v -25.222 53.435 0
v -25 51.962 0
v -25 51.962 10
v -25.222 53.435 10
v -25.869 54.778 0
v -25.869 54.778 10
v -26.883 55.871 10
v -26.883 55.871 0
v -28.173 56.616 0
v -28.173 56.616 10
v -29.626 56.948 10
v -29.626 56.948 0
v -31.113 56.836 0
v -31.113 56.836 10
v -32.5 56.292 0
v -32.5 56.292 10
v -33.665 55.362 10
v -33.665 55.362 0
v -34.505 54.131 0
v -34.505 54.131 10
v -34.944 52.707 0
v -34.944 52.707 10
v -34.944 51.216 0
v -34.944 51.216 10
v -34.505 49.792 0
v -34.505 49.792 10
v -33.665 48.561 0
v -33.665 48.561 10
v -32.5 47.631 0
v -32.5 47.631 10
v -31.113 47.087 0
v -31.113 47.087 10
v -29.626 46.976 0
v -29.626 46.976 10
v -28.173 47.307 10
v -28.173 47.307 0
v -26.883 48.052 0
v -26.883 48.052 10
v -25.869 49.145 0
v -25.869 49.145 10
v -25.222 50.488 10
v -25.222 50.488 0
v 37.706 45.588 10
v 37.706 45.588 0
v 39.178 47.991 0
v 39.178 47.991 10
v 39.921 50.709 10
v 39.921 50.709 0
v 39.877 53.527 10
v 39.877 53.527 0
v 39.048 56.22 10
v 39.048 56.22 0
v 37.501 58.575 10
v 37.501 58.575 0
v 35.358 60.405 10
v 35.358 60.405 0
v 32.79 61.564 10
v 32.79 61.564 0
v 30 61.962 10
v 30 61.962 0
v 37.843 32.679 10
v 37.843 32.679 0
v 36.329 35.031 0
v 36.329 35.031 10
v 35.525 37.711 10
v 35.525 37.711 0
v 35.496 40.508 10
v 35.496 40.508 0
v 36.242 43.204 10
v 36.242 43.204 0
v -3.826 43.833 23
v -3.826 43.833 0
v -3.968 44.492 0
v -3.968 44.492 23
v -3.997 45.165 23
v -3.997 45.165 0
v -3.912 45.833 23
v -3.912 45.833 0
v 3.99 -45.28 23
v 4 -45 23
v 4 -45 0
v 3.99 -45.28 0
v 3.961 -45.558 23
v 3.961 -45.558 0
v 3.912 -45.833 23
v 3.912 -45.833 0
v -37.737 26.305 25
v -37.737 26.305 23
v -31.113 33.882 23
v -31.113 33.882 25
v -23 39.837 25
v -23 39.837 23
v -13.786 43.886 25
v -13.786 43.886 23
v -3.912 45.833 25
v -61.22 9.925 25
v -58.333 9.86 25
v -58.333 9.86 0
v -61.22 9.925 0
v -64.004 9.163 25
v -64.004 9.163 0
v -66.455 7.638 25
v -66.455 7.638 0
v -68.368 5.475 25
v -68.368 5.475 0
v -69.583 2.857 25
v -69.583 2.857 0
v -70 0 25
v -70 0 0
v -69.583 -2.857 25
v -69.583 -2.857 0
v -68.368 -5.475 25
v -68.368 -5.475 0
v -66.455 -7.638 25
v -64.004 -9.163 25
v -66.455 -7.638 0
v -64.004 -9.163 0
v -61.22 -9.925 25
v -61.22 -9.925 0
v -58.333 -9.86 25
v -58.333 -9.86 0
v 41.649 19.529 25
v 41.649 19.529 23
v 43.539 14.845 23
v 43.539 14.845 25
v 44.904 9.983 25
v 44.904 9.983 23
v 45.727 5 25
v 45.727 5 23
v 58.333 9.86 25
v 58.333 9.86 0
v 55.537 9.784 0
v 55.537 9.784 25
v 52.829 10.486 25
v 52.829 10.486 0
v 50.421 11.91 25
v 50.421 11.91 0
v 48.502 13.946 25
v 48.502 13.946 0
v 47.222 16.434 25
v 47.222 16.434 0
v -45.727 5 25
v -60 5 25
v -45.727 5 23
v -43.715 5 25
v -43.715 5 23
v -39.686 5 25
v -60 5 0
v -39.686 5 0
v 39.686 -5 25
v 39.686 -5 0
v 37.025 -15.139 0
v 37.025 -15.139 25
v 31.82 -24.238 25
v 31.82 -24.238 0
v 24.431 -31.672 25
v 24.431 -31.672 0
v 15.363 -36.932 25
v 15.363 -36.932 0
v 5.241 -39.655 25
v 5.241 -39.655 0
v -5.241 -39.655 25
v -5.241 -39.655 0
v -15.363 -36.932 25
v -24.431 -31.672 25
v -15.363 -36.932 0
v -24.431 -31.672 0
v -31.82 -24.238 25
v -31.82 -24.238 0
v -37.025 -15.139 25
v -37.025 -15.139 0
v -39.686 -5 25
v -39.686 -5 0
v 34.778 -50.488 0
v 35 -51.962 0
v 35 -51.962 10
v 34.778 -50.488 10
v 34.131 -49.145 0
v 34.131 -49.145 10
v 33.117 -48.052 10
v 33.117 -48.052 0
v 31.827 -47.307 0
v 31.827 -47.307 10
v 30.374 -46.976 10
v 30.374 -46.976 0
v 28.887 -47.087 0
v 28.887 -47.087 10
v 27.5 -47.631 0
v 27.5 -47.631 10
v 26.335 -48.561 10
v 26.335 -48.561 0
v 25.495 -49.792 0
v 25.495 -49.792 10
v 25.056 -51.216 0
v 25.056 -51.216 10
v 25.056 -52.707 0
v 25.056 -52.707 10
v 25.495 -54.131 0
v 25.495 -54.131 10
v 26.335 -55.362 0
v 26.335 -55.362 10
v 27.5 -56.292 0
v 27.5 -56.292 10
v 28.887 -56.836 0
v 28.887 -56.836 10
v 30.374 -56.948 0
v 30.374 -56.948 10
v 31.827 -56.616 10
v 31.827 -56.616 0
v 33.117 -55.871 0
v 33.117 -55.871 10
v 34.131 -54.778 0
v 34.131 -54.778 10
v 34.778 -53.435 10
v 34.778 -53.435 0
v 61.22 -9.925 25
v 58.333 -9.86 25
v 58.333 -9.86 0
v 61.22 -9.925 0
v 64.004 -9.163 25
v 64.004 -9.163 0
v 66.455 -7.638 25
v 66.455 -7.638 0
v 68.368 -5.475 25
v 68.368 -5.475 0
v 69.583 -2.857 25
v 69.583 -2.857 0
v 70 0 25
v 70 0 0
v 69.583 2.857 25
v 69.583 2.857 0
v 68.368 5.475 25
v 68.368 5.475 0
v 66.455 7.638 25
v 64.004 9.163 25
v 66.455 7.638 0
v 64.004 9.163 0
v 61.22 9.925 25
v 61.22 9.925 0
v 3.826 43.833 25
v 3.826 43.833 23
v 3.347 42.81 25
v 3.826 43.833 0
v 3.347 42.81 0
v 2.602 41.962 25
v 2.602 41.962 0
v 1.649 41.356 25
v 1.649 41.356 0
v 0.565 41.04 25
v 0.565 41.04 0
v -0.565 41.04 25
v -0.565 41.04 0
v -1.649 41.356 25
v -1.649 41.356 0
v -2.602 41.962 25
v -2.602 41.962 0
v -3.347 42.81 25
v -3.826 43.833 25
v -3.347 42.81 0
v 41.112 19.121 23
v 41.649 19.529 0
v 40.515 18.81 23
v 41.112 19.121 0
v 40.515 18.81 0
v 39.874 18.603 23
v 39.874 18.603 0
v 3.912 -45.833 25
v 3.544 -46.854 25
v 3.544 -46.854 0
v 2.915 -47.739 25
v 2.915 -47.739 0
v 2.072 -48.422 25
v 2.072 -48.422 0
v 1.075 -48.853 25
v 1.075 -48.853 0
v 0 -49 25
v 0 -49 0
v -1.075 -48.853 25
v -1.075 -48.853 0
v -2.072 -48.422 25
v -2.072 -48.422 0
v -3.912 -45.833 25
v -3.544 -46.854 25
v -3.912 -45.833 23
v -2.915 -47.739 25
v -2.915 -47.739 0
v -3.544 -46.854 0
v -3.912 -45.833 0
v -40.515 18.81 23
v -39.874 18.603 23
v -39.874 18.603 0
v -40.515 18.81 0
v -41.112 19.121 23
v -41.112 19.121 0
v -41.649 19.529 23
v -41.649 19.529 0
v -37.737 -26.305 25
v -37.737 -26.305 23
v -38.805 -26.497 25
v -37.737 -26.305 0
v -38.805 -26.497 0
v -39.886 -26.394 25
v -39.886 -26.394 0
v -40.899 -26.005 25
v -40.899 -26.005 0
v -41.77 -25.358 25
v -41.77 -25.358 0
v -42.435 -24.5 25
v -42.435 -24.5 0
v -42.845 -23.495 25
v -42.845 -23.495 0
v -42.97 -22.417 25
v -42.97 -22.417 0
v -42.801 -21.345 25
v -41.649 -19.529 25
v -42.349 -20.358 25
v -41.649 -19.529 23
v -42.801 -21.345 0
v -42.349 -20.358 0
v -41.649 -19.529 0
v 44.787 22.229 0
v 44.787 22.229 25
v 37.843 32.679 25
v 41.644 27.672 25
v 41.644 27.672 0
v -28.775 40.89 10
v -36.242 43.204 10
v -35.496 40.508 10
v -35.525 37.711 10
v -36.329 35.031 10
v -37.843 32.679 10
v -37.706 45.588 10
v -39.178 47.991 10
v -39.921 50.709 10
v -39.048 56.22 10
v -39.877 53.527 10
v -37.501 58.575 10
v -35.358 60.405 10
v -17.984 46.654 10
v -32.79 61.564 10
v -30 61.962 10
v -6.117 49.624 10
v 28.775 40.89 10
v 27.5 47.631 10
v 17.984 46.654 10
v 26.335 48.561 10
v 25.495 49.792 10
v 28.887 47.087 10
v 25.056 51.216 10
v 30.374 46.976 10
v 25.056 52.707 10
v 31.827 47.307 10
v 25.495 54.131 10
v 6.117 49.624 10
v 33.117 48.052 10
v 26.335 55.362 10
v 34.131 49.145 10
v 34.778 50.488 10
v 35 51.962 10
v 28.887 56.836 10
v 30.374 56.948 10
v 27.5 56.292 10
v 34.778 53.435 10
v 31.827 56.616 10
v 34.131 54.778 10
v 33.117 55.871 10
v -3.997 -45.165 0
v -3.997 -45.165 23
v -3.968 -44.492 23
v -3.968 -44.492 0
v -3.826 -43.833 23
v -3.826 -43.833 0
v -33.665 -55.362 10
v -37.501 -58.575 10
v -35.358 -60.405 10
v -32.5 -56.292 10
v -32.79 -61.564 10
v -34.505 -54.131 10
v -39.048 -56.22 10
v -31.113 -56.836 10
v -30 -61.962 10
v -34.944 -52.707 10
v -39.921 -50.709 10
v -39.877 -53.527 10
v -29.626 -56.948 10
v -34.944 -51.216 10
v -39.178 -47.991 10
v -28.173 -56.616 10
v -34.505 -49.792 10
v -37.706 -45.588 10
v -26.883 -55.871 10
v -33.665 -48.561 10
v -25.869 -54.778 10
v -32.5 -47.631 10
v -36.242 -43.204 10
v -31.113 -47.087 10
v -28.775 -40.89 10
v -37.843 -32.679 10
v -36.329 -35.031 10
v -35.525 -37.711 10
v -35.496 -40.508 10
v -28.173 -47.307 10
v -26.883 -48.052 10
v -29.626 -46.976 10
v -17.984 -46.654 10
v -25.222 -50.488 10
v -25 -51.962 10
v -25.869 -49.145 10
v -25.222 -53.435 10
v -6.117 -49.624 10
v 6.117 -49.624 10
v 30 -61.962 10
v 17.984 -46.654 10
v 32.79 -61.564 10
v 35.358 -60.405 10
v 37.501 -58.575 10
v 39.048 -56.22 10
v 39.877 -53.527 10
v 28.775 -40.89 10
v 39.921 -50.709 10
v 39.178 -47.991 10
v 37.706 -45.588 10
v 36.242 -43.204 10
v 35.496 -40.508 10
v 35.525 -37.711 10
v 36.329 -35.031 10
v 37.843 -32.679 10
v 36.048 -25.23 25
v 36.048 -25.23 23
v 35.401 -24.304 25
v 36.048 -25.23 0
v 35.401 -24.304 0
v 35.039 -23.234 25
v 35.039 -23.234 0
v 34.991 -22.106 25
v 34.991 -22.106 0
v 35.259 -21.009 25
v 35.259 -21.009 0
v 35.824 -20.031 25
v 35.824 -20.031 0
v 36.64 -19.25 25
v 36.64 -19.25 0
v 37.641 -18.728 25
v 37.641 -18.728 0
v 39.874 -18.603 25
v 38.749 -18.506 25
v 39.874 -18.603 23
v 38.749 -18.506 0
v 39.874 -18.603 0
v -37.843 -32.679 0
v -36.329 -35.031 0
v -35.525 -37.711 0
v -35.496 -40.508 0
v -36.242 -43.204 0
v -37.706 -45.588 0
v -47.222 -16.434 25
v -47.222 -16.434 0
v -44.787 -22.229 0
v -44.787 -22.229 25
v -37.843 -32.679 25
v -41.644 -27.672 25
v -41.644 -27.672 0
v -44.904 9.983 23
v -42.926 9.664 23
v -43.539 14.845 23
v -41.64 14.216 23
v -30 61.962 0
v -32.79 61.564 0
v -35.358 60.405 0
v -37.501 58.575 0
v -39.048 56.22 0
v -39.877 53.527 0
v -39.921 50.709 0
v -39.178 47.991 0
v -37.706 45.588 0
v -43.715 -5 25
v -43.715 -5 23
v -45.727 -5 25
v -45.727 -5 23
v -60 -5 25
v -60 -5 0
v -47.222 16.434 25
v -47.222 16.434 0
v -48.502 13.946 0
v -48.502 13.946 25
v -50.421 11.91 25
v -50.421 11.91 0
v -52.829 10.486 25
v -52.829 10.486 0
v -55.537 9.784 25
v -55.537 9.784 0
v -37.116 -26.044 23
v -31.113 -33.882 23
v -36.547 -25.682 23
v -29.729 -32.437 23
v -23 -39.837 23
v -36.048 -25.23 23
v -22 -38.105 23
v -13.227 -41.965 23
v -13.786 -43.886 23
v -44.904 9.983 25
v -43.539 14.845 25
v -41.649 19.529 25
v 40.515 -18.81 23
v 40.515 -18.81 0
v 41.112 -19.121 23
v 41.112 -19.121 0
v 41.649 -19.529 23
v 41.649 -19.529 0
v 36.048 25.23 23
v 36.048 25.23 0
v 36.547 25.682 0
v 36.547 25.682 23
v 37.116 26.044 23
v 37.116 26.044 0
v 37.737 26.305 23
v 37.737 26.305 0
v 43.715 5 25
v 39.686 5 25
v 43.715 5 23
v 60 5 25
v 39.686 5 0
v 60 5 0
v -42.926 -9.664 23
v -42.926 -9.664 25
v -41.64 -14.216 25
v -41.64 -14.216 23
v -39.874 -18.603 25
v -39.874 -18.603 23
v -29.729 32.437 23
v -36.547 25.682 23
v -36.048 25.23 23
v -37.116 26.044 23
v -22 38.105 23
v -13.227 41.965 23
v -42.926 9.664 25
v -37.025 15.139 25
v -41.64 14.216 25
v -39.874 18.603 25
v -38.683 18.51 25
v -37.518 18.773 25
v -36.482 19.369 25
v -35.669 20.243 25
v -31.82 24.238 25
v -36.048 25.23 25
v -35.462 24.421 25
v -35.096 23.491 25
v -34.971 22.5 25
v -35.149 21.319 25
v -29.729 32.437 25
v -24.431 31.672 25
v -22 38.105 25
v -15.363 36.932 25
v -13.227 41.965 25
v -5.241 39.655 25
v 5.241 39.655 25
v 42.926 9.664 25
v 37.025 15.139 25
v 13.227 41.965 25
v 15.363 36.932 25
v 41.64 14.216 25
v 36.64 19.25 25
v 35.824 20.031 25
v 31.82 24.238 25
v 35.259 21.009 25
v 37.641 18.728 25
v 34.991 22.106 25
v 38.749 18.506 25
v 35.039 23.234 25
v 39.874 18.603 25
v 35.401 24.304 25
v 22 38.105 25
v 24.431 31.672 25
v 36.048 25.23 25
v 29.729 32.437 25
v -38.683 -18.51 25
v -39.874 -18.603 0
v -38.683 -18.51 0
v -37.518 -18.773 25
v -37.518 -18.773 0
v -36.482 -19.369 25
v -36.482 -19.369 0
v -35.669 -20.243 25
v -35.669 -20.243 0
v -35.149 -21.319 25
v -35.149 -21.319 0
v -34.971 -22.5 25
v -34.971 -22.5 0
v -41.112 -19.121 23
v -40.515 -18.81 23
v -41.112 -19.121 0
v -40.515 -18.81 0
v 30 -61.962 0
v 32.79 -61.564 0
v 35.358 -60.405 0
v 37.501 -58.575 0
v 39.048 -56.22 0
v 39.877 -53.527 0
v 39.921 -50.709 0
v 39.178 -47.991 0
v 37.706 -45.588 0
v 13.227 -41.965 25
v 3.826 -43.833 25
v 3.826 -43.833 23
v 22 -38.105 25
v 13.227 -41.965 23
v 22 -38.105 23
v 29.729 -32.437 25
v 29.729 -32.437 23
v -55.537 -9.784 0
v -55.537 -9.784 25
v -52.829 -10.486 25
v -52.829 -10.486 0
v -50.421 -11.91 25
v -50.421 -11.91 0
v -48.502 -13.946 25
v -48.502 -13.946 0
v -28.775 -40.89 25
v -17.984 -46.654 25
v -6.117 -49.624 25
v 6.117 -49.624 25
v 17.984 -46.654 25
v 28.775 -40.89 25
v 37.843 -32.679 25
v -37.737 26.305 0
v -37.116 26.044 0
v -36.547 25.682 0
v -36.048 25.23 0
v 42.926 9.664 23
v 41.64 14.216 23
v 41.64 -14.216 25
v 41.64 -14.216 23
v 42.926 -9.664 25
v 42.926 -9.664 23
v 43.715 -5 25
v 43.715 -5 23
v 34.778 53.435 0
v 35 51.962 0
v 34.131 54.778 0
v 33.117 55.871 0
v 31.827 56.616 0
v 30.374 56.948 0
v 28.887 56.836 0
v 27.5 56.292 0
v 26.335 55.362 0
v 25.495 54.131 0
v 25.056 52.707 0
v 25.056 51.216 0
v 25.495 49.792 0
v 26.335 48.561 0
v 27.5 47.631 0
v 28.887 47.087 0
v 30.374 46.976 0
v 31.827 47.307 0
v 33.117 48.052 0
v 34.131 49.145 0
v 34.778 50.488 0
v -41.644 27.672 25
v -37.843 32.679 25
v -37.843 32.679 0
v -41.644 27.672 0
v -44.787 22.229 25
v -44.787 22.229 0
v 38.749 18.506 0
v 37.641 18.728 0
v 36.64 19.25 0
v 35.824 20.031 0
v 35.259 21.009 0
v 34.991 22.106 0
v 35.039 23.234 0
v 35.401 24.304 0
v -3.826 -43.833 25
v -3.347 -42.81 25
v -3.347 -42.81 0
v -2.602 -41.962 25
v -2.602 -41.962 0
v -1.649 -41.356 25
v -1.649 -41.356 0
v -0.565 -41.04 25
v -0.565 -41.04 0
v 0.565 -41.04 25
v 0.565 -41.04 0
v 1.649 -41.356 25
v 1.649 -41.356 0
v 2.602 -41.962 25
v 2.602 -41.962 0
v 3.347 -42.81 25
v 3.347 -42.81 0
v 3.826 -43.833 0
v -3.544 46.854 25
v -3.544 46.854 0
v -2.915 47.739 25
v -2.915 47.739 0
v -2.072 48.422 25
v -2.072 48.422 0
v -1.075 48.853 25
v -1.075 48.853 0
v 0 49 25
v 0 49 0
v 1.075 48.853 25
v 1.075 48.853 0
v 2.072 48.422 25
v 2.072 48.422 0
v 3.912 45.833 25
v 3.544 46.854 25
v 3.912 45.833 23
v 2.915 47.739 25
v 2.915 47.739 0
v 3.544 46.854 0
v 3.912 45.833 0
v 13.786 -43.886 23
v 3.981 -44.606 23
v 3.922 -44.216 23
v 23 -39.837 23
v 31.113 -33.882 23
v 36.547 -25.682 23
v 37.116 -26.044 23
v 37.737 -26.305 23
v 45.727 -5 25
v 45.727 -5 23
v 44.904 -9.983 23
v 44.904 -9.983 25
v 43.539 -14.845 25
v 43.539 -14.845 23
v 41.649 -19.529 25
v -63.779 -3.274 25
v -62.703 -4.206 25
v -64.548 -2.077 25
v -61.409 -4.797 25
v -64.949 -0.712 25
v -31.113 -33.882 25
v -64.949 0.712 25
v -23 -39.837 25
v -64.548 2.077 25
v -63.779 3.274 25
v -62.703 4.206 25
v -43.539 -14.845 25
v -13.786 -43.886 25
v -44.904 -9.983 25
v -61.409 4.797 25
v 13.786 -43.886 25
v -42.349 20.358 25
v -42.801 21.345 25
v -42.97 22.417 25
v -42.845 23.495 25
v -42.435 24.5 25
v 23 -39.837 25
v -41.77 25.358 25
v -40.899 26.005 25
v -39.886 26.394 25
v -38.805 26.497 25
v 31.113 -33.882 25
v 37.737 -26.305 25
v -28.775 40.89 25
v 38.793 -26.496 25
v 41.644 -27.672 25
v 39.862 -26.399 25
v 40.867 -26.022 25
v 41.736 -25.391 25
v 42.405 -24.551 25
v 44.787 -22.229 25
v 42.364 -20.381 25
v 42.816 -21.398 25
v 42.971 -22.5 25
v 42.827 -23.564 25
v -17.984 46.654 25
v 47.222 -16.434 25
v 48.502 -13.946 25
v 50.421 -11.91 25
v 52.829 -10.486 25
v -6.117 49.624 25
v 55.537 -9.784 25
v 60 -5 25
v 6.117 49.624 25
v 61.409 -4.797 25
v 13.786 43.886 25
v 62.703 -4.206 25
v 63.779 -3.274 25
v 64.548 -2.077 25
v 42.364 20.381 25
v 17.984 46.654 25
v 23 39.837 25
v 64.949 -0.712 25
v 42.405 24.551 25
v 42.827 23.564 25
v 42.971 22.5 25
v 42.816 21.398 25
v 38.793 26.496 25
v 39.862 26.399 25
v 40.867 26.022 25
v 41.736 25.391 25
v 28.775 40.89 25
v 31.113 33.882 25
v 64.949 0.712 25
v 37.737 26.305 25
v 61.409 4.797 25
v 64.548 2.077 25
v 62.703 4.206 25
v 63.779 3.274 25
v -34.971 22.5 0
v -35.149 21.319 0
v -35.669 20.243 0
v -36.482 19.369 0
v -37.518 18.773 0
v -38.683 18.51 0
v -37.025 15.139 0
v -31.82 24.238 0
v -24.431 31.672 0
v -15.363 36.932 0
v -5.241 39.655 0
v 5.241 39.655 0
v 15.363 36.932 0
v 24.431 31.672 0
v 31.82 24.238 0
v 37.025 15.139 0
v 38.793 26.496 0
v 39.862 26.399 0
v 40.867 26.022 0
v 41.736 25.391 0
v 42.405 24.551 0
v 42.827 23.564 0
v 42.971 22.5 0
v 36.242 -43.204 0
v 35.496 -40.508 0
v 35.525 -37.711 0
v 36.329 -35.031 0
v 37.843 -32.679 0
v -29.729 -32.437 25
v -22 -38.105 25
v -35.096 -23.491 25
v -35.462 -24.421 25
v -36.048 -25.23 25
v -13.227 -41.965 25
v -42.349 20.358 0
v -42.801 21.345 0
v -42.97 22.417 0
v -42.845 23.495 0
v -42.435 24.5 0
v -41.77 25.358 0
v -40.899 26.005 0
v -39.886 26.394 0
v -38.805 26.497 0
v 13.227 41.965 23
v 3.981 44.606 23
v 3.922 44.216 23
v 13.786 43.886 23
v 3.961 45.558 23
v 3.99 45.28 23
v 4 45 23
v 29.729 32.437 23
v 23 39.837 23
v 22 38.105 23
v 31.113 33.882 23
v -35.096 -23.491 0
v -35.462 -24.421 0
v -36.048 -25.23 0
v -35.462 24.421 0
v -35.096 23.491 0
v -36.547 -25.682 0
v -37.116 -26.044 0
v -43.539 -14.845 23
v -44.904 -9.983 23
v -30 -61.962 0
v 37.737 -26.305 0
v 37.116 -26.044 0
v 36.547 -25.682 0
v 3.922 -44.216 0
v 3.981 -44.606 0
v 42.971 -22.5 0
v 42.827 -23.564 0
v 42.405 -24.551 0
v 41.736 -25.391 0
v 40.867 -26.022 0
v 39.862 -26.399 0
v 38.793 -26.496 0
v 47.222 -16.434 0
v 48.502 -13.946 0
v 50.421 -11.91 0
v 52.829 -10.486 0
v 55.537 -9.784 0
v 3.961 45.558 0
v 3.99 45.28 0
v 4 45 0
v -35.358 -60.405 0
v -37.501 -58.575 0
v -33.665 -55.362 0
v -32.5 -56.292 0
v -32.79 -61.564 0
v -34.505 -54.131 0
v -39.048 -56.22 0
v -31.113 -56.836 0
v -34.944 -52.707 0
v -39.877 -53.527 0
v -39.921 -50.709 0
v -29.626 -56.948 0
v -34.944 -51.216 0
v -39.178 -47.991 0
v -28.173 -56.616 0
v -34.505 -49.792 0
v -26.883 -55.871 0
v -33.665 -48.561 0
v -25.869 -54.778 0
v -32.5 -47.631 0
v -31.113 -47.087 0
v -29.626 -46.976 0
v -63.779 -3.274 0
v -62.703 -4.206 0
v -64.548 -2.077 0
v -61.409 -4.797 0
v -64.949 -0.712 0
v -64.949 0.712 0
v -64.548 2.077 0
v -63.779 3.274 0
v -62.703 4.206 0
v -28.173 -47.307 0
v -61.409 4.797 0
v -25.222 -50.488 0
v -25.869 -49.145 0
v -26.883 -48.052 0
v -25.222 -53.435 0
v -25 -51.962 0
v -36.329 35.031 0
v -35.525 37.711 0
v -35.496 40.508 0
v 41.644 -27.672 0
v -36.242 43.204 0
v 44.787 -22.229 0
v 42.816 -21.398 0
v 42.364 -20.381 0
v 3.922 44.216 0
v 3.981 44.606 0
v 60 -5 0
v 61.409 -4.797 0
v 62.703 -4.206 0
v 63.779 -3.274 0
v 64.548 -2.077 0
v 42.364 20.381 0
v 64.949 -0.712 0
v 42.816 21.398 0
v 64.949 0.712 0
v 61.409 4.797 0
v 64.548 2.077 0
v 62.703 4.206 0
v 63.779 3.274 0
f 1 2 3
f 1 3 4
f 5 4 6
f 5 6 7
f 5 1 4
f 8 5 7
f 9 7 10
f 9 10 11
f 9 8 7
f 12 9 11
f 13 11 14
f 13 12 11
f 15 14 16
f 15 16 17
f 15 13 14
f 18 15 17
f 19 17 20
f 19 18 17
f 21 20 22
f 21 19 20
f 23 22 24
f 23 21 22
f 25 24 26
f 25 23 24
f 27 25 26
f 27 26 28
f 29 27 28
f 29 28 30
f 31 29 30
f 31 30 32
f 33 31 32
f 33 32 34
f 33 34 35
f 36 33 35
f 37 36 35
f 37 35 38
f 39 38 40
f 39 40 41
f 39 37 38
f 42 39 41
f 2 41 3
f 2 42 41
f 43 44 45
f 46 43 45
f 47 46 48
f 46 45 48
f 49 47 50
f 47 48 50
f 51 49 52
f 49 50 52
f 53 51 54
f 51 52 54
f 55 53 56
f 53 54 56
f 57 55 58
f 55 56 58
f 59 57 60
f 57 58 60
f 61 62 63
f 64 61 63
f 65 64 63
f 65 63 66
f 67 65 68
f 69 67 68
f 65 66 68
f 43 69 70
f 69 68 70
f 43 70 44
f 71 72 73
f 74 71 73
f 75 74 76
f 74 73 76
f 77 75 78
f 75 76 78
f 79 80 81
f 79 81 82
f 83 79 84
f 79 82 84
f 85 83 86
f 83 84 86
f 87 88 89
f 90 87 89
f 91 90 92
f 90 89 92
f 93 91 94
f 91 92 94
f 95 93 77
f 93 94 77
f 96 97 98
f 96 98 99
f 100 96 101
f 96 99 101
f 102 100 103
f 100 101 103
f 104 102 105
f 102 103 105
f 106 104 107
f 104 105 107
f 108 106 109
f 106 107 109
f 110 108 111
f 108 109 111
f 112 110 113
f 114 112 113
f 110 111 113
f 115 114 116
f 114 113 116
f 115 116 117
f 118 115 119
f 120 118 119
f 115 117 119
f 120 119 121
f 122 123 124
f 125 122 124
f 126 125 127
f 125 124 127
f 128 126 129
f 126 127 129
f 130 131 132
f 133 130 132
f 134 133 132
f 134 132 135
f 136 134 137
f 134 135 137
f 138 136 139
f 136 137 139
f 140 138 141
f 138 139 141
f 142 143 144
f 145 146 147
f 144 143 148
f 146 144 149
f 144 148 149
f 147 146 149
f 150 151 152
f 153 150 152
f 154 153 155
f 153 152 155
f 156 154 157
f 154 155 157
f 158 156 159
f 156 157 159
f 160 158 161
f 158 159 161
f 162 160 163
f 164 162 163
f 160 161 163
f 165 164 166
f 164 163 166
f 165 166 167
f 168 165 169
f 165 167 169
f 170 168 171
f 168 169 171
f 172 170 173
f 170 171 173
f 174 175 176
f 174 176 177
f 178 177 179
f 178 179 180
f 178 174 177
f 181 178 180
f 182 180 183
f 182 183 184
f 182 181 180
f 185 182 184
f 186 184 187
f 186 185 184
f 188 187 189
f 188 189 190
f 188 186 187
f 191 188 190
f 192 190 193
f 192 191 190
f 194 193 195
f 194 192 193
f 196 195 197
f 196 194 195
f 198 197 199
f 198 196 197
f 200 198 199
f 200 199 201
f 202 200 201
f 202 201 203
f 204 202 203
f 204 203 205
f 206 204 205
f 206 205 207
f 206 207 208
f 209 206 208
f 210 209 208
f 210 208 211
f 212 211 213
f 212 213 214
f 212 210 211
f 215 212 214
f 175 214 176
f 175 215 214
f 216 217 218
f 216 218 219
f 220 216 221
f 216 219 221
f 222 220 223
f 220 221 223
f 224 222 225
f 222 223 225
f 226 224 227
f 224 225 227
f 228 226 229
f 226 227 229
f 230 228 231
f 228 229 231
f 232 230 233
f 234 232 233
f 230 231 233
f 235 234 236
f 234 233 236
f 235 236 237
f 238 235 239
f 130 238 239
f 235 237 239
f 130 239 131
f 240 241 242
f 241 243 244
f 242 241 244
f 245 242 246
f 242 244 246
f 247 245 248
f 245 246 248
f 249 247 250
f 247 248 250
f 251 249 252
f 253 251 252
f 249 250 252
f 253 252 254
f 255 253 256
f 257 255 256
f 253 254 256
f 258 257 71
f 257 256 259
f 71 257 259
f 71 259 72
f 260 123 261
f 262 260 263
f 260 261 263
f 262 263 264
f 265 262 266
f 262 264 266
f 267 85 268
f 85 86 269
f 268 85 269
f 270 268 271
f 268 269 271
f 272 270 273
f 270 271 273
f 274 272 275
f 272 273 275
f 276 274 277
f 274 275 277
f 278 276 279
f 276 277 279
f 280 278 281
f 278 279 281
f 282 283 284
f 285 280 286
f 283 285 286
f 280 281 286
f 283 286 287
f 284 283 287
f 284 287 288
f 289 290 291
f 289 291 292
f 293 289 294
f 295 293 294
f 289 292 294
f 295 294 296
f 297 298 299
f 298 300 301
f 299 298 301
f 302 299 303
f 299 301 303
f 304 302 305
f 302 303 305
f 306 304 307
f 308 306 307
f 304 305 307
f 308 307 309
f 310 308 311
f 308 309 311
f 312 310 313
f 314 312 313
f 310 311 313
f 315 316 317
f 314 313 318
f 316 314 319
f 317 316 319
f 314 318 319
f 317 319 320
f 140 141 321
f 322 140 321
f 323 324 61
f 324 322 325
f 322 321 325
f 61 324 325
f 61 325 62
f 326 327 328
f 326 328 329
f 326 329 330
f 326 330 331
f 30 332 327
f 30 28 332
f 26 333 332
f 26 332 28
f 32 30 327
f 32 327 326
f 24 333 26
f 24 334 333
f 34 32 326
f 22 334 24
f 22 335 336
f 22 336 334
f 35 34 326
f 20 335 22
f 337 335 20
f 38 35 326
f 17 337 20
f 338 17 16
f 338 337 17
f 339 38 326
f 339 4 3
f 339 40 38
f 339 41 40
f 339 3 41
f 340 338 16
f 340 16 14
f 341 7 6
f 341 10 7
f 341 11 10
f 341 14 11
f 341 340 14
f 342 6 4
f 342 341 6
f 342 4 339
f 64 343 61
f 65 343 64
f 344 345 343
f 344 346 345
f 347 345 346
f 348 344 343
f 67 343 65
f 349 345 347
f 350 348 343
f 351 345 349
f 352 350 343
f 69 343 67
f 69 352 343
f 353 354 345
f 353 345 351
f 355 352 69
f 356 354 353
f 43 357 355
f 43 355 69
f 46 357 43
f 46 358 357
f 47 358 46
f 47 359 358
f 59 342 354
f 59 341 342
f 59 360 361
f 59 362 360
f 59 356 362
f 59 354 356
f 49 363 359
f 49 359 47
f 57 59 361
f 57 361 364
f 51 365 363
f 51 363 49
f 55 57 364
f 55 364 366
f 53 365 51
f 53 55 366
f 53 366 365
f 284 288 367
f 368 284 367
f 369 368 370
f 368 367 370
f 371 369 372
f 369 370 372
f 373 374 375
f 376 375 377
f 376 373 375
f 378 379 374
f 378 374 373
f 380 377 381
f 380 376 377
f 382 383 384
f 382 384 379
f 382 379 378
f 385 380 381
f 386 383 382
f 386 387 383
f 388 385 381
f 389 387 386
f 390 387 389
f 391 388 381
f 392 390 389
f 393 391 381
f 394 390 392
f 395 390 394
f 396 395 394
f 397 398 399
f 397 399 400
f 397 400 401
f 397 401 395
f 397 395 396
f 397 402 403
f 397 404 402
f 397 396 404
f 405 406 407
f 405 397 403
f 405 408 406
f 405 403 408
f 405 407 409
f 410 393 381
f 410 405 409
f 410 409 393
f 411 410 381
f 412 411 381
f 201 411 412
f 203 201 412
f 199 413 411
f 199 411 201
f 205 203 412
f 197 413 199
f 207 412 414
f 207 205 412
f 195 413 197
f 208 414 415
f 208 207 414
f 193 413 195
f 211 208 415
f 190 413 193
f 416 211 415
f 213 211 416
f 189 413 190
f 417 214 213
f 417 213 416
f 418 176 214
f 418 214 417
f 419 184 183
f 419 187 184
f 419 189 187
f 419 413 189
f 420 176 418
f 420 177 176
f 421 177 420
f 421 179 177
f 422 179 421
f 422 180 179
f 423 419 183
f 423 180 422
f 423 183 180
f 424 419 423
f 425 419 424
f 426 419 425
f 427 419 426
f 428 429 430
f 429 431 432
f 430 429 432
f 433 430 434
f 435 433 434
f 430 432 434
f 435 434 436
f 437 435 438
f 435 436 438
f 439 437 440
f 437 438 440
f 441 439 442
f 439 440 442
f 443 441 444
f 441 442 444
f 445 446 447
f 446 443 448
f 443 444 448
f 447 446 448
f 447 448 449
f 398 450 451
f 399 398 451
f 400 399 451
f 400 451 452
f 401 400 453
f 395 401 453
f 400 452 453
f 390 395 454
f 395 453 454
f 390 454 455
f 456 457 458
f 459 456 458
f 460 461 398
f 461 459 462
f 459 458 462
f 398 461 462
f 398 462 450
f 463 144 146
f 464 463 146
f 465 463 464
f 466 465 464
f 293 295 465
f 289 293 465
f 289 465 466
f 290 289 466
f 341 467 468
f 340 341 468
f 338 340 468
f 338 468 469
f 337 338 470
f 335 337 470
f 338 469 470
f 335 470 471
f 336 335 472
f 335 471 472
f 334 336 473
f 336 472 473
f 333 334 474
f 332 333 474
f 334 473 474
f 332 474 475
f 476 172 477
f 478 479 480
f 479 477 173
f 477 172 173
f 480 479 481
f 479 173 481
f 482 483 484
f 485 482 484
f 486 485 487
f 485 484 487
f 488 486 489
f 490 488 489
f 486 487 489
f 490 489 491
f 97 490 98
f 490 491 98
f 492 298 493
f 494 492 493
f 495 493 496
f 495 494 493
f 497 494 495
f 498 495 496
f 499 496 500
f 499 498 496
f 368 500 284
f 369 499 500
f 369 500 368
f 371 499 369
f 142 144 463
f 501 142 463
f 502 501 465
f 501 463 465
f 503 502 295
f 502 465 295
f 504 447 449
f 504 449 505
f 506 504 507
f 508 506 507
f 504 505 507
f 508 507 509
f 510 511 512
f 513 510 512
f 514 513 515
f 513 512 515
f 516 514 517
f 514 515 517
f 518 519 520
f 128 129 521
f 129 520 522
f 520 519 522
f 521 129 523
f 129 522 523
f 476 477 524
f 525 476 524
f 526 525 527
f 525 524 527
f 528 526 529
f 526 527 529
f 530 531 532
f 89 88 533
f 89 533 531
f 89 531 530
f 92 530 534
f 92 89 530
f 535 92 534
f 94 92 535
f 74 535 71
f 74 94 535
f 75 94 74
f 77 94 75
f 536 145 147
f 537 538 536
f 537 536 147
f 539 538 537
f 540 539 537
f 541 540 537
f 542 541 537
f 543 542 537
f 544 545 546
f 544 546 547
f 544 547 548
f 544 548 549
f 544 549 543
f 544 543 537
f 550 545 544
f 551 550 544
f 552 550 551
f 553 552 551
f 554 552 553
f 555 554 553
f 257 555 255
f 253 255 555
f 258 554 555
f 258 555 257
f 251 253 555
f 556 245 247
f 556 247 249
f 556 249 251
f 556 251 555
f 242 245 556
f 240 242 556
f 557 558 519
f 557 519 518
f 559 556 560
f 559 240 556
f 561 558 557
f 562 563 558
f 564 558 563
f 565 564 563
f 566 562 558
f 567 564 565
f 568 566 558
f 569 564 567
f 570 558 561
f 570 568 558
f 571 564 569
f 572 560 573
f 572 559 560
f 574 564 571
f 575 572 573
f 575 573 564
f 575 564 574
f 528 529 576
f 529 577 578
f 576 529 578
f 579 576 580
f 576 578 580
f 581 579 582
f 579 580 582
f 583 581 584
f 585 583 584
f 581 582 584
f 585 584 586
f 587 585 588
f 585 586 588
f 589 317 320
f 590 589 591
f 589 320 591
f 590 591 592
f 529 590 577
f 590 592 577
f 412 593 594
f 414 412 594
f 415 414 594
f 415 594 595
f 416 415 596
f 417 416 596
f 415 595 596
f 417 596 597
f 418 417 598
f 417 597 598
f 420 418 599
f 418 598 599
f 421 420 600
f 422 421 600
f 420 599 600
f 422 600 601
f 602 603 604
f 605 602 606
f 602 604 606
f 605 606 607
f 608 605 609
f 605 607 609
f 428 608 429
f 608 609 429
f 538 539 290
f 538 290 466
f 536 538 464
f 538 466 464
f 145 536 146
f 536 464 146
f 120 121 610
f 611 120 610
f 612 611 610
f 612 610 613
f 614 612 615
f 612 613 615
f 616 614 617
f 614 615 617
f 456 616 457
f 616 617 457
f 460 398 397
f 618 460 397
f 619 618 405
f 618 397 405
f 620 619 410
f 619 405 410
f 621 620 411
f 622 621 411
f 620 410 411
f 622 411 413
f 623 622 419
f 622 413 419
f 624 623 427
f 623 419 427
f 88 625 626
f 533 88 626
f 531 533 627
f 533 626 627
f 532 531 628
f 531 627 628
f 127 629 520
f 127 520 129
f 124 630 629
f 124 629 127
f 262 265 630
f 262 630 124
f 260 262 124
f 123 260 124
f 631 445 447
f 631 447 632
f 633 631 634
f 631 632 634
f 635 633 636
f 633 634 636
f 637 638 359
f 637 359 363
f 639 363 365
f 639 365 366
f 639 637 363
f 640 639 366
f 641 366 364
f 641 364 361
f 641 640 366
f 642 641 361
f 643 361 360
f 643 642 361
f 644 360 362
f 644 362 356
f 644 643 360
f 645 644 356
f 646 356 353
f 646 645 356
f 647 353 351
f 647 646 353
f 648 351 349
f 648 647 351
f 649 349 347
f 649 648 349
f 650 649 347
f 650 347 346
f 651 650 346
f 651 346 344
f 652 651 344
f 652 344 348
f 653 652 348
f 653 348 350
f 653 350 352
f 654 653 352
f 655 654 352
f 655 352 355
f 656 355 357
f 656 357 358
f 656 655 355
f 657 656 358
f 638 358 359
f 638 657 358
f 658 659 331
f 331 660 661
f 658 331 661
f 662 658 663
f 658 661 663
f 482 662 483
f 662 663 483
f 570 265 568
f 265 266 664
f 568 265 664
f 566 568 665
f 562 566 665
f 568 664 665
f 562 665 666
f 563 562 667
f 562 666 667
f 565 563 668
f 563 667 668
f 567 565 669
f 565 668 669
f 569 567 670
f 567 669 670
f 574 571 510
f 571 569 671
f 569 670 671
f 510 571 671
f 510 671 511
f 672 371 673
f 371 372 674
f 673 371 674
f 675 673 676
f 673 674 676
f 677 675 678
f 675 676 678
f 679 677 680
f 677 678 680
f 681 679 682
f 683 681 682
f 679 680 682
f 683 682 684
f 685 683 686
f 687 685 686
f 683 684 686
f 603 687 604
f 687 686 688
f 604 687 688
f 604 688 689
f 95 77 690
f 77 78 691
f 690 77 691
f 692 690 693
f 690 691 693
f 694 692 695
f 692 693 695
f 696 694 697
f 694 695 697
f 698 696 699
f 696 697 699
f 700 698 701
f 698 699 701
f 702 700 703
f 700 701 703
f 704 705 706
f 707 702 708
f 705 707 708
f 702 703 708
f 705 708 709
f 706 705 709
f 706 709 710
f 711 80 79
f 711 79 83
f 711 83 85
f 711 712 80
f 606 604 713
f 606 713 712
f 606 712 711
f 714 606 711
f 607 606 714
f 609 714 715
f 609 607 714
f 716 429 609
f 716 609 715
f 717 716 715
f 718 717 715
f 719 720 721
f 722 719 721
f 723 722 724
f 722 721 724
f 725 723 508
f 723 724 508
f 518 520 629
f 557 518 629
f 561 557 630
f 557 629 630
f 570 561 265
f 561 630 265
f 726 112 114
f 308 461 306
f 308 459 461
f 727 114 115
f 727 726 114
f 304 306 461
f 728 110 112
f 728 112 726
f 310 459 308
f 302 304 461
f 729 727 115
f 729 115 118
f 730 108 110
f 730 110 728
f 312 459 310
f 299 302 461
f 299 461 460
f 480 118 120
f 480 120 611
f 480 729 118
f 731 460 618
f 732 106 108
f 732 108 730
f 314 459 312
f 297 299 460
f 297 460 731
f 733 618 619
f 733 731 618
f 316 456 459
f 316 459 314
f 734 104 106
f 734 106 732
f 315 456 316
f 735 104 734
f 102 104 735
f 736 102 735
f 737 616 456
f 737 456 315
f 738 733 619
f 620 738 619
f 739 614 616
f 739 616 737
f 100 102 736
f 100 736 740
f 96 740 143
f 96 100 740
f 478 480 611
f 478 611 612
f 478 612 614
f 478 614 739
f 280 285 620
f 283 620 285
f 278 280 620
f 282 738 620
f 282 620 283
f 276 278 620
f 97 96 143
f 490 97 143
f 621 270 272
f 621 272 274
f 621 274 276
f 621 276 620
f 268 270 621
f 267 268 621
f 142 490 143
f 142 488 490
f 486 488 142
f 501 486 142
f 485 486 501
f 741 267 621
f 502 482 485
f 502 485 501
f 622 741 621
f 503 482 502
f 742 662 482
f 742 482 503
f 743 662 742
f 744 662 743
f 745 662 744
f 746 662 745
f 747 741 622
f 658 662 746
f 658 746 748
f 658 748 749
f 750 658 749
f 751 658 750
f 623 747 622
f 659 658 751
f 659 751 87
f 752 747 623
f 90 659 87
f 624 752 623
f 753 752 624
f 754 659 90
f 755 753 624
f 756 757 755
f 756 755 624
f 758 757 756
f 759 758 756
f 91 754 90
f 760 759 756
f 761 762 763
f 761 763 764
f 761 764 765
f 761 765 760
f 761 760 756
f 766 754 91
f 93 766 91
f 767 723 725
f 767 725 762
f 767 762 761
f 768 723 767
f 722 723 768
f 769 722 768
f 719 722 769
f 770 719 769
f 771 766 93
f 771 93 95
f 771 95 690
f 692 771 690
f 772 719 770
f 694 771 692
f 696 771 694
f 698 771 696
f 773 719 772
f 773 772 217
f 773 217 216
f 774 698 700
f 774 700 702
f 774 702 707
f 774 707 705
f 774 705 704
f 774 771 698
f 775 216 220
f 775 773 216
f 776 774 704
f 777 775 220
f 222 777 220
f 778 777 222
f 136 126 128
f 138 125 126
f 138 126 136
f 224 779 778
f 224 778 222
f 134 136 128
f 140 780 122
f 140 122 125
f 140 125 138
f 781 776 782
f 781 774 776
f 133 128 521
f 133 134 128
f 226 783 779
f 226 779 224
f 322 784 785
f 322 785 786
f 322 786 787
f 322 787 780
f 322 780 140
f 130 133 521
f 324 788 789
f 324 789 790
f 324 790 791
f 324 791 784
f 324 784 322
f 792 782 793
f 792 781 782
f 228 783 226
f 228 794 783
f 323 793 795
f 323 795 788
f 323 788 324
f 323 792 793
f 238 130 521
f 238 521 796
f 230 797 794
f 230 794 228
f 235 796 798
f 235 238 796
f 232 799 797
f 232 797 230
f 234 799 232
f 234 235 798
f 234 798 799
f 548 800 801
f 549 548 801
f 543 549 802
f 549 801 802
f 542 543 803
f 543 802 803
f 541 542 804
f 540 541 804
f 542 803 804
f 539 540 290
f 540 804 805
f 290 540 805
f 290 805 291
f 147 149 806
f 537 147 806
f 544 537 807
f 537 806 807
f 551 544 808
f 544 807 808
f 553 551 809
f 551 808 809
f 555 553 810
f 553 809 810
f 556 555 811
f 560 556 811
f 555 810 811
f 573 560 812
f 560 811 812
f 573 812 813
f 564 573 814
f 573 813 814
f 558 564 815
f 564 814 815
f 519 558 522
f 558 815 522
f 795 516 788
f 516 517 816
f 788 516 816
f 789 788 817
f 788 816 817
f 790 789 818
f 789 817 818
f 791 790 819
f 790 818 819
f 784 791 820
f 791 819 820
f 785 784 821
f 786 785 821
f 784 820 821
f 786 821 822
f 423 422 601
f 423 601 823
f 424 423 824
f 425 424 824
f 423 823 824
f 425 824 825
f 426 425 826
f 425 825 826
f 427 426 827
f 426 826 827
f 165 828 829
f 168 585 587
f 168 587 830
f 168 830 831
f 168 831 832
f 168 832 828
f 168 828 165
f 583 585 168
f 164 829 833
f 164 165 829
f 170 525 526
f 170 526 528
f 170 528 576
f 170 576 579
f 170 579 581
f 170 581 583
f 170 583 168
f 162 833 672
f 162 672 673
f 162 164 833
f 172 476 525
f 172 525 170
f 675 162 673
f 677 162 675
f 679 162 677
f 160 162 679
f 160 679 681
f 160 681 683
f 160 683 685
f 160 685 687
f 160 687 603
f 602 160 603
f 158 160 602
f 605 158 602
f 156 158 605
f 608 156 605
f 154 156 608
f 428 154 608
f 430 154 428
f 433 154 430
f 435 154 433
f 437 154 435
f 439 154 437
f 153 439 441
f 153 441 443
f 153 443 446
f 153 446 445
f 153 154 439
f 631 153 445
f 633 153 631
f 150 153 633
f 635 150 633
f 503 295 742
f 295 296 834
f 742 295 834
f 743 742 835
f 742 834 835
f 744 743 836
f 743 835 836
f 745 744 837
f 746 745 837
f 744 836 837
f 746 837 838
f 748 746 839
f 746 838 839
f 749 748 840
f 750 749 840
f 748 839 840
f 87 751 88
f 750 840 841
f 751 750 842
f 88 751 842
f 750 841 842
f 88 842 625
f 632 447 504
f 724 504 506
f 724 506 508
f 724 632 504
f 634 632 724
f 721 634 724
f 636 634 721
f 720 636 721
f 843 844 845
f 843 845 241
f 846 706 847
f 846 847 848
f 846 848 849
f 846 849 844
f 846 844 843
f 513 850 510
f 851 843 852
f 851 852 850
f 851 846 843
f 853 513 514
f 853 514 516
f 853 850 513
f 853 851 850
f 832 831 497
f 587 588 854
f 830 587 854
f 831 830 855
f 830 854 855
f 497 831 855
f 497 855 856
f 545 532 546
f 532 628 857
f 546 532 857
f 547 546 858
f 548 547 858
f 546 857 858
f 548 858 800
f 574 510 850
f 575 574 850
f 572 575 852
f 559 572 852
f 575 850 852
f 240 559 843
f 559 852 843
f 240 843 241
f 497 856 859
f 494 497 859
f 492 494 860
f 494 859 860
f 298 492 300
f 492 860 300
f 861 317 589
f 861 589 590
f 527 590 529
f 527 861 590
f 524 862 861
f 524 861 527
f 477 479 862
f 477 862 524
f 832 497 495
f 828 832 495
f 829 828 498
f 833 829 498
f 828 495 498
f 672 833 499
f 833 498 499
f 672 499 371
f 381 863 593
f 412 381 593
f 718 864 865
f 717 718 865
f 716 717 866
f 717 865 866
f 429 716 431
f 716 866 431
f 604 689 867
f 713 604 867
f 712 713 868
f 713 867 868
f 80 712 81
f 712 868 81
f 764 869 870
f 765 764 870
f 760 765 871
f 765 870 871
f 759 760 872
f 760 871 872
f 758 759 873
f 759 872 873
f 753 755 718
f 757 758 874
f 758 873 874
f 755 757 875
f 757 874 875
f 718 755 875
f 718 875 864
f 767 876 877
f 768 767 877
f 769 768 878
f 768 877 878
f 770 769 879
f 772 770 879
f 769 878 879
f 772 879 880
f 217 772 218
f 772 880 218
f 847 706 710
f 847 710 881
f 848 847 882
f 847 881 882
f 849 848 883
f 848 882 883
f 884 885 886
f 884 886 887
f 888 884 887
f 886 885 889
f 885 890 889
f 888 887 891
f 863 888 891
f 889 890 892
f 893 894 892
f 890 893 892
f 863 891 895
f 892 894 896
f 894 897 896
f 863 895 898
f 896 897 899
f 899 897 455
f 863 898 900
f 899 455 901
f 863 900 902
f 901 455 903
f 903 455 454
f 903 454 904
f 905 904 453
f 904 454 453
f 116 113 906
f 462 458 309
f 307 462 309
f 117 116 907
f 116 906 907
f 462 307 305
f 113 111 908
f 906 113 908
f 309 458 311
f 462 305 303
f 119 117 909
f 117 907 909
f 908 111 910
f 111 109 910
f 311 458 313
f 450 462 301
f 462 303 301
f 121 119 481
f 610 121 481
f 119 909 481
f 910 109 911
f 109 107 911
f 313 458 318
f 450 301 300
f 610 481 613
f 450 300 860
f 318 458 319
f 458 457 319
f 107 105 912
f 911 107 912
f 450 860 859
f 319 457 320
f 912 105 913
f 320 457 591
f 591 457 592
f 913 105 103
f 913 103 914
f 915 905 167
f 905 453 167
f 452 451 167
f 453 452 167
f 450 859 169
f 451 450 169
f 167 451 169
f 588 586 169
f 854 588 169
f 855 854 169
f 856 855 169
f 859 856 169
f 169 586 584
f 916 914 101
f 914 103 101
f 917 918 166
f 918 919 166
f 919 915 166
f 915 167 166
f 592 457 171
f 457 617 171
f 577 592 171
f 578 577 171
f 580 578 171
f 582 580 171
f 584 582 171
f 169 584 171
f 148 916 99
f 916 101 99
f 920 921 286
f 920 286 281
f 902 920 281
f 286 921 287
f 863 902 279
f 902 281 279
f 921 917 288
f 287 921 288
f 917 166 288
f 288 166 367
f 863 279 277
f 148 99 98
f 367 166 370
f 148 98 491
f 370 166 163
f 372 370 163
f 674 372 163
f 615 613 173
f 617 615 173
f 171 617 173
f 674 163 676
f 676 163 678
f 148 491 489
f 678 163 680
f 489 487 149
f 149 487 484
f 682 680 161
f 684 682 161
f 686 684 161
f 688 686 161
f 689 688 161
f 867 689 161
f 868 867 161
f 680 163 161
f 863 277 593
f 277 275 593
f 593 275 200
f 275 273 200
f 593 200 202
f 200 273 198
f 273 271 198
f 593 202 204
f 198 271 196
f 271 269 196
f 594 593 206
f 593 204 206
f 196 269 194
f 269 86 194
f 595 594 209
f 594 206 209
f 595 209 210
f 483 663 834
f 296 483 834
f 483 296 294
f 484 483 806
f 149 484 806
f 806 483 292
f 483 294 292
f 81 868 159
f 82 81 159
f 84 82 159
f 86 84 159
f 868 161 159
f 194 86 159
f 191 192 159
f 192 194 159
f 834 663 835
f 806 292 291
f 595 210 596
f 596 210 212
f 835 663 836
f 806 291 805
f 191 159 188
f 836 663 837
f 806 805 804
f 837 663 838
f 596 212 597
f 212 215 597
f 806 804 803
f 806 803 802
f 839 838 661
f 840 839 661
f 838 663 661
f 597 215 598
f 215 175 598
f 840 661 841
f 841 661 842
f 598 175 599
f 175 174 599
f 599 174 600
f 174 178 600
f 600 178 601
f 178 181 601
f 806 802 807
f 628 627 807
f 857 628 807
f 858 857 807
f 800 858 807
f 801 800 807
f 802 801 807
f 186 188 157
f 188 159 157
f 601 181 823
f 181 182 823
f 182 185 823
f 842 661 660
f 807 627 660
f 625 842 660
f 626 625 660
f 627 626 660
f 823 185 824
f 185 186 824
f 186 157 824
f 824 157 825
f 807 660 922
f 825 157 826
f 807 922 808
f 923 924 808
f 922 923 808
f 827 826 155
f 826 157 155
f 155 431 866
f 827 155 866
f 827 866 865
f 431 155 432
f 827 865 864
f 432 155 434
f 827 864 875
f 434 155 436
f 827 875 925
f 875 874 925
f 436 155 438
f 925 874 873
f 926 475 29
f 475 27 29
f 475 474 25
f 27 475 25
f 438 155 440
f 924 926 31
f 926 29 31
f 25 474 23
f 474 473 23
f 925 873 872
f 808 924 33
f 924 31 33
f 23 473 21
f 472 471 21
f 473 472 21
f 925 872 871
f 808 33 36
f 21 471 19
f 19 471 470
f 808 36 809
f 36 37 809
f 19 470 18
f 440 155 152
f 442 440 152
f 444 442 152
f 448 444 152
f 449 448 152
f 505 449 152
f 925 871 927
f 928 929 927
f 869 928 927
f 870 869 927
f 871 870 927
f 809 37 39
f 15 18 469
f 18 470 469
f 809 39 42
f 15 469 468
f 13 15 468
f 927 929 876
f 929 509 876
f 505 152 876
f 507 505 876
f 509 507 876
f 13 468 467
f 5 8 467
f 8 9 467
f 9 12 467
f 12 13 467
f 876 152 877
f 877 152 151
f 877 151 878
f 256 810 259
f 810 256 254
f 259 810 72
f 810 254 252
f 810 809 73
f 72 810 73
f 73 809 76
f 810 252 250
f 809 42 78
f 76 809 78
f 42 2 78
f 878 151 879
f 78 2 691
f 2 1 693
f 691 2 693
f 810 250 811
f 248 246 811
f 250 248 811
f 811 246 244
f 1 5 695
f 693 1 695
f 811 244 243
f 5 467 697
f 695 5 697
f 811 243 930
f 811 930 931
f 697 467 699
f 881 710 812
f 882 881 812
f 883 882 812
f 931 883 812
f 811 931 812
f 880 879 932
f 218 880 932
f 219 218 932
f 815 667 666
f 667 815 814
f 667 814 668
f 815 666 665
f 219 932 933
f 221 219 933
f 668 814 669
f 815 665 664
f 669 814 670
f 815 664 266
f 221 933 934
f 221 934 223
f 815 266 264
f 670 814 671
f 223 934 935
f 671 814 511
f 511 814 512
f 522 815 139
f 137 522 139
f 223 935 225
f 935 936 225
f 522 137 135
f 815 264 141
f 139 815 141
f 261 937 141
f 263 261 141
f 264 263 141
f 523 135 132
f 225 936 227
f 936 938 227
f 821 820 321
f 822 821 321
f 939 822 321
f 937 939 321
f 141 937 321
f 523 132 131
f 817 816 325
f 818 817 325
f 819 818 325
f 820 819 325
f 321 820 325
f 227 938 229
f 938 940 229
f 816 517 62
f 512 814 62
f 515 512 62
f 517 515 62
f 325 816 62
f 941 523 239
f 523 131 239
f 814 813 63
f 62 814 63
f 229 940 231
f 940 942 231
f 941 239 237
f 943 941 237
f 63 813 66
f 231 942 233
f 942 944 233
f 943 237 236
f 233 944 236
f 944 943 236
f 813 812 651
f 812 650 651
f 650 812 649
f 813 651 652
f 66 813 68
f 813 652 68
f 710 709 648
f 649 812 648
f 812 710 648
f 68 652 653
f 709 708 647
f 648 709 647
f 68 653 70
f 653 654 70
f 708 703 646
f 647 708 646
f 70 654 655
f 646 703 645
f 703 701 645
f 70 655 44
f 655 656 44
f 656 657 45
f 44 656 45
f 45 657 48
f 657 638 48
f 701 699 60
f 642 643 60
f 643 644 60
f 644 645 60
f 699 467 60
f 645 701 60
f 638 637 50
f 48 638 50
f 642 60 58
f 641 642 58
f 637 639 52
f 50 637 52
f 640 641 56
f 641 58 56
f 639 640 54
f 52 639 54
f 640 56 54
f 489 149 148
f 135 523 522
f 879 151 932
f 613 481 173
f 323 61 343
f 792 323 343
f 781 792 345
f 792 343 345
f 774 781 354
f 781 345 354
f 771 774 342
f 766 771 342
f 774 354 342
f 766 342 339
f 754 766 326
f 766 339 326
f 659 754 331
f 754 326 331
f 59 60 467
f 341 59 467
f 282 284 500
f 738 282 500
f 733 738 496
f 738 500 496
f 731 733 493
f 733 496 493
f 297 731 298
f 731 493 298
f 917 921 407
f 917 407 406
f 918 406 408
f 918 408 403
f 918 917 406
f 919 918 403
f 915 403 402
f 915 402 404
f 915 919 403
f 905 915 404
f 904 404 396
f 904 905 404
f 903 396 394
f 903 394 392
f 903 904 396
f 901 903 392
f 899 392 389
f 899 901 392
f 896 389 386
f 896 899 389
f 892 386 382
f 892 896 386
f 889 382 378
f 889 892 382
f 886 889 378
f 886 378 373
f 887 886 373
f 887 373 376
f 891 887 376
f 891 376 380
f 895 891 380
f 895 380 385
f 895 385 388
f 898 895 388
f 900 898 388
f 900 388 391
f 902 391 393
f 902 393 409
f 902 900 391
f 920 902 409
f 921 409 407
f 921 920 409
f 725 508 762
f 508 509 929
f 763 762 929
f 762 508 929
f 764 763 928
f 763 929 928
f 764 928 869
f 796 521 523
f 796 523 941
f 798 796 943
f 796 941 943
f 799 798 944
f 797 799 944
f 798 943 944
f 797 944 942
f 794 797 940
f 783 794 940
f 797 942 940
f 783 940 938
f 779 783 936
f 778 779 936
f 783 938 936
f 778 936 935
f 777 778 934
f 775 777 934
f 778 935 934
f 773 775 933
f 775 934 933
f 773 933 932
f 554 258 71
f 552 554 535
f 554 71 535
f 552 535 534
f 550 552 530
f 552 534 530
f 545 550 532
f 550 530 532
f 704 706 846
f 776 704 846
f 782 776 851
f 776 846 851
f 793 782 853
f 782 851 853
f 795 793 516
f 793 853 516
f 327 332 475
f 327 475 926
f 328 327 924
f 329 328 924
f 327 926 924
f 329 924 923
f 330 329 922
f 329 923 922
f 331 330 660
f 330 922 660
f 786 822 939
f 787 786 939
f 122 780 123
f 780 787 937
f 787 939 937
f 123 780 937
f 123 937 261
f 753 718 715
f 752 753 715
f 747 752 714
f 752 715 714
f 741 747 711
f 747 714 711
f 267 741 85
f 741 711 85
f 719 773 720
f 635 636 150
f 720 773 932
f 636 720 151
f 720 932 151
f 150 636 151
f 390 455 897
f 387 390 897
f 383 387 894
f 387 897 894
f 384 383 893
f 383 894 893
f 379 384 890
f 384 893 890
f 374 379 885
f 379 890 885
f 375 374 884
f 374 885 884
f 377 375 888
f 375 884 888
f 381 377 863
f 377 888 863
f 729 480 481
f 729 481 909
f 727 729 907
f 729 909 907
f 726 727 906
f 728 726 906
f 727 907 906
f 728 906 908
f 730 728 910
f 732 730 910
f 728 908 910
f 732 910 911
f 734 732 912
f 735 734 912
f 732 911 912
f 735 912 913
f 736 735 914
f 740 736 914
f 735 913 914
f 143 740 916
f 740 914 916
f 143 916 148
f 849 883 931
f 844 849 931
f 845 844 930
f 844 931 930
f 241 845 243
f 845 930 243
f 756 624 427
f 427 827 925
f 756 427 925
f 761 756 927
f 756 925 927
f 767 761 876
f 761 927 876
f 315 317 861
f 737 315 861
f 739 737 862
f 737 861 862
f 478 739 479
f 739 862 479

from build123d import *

# Parameters (mm, degrees)
SKETCH2_R             = 5
BOSS_EXTRUDE1_DEPTH   = 10
BOSS_EXTRUDE1_2_DEPTH = 10
BOSS_EXTRUDE2_DEPTH   = 25
BOSS_EXTRUDE3_DEPTH   = 23


with BuildPart() as part:
    # Sketch2 → Boss-Extrude1 (new body)
    with BuildSketch(Plane.XY):
        with BuildLine():
            Line((30, 61.961524227), (-30, 61.961524227))
            ThreePointArc((-30, 61.961524227), (-39.04805011, 56.219785516), (-37.705792305, 45.588082068))
            ThreePointArc((-37.705792305, 45.588082068), (-35.412149299, 39.10836922), (-37.842987175, 32.678866591))
            ThreePointArc((-37.842987175, 32.678866591), (0, 50), (37.842987175, 32.678866591))
            ThreePointArc((37.842987175, 32.678866591), (35.412149299, 39.10836922), (37.705792305, 45.588082068))
            ThreePointArc((37.705792305, 45.588082068), (39.04805011, 56.219785516), (30, 61.961524227))
        make_face()
        with Locations((-30, 51.961524227)):
            Circle(SKETCH2_R, mode=Mode.SUBTRACT)
        with Locations((30, 51.961524227)):
            Circle(SKETCH2_R, mode=Mode.SUBTRACT)
    extrude(amount=BOSS_EXTRUDE1_DEPTH)



with BuildPart() as body_2:
    # Sketch2 → Boss-Extrude1 2 (new body)
    with BuildSketch(Plane.XY):
        with BuildLine():
            ThreePointArc((37.842987175, -32.678866591), (0, -50), (-37.842987175, -32.678866591))
            ThreePointArc((-37.842987175, -32.678866591), (-35.412149299, -39.10836922), (-37.705792305, -45.588082068))
            ThreePointArc((-37.705792305, -45.588082068), (-39.04805011, -56.219785516), (-30, -61.961524227))
            Line((-30, -61.961524227), (30, -61.961524227))
            ThreePointArc((30, -61.961524227), (39.04805011, -56.219785516), (37.705792305, -45.588082068))
            ThreePointArc((37.705792305, -45.588082068), (35.412149299, -39.10836922), (37.842987175, -32.678866591))
        make_face()
        with Locations((-30, -51.961524227)):
            Circle(SKETCH2_R, mode=Mode.SUBTRACT)
        with Locations((30, -51.961524227)):
            Circle(SKETCH2_R, mode=Mode.SUBTRACT)
    extrude(amount=BOSS_EXTRUDE1_2_DEPTH)


with BuildPart() as part_1:
    add(part.part)

    add(body_2.part)  # Boss-Extrude2 merges body 2
    # Sketch2<3> → Boss-Extrude2 (add)
    # profile 1 of 3: a face of its own
    with BuildSketch(Plane.XY):
        with BuildLine():
            ThreePointArc((47.222222222, 16.433554953), (0, 50), (-47.222222222, 16.433554953))
            ThreePointArc((-47.222222222, 16.433554953), (-51.574915894, 11.113636285), (-58.333333333, 9.860132972))
            ThreePointArc((-58.333333333, 9.860132972), (-70, 0), (-58.333333333, -9.860132972))
            ThreePointArc((-58.333333333, -9.860132972), (-51.574915894, -11.113636285), (-47.222222222, -16.433554953))
            ThreePointArc((-47.222222222, -16.433554953), (0, -50), (47.222222222, -16.433554953))
            ThreePointArc((47.222222222, -16.433554953), (51.574915894, -11.113636285), (58.333333333, -9.860132972))
            ThreePointArc((58.333333333, -9.860132972), (70, 0), (58.333333333, 9.860132972))
            ThreePointArc((58.333333333, 9.860132972), (51.574915894, 11.113636285), (47.222222222, 16.433554953))
        make_face()
        with BuildLine():
            Line((-60, 5), (-45.727453461, 5))
            ThreePointArc((-45.727453461, 5), (-44.288019832, 12.432670643), (-41.648946773, 19.528574775))
            ThreePointArc((-41.648946773, 19.528574775), (-42.435244785, 24.5), (-37.736715241, 26.304758558))
            ThreePointArc((-37.736715241, 26.304758558), (-23, 39.837168574), (-3.912231531, 45.833333333))
            ThreePointArc((-3.912231531, 45.833333333), (0, 49), (3.912231531, 45.833333333))
            ThreePointArc((3.912231531, 45.833333333), (23, 39.837168574), (37.736715241, 26.304758558))
            ThreePointArc((37.736715241, 26.304758558), (42.435244785, 24.5), (41.648946773, 19.528574775))
            ThreePointArc((41.648946773, 19.528574775), (44.288019832, 12.432670643), (45.727453461, 5))
            Line((45.727453461, 5), (60, 5))
            ThreePointArc((60, 5), (65, 0), (60, -5))
            Line((60, -5), (45.727453461, -5))
            ThreePointArc((45.727453461, -5), (44.288019832, -12.432670643), (41.648946773, -19.528574775))
            ThreePointArc((41.648946773, -19.528574775), (42.435244785, -24.5), (37.736715241, -26.304758558))
            ThreePointArc((37.736715241, -26.304758558), (23, -39.837168574), (3.912231531, -45.833333333))
            ThreePointArc((3.912231531, -45.833333333), (0, -49), (-3.912231531, -45.833333333))
            ThreePointArc((-3.912231531, -45.833333333), (-23, -39.837168574), (-37.736715241, -26.304758558))
            ThreePointArc((-37.736715241, -26.304758558), (-42.435244785, -24.5), (-41.648946773, -19.528574775))
            ThreePointArc((-41.648946773, -19.528574775), (-44.288019832, -12.432670643), (-45.727453461, -5))
            Line((-45.727453461, -5), (-60, -5))
            ThreePointArc((-60, -5), (-65, 0), (-60, 5))
        make_face(mode=Mode.SUBTRACT)
    # profile 2 of 3: a face of its own
    with BuildSketch(Plane.XY):
        with BuildLine():
            Line((-39.686269666, -5), (-43.714985989, -5))
            ThreePointArc((-43.714985989, -5), (-42.344229671, -11.956847978), (-39.873820246, -18.603184108))
            ThreePointArc((-39.873820246, -18.603184108), (-35.507041555, -20.5), (-36.047740152, -25.230149225))
            ThreePointArc((-36.047740152, -25.230149225), (-22, -38.105117767), (-3.826080094, -43.833333333))
            ThreePointArc((-3.826080094, -43.833333333), (0, -41), (3.826080094, -43.833333333))
            ThreePointArc((3.826080094, -43.833333333), (22, -38.105117767), (36.047740152, -25.230149225))
            ThreePointArc((36.047740152, -25.230149225), (35.507041555, -20.5), (39.873820246, -18.603184108))
            ThreePointArc((39.873820246, -18.603184108), (42.344229671, -11.956847978), (43.714985989, -5))
            Line((43.714985989, -5), (39.686269666, -5))
            ThreePointArc((39.686269666, -5), (0, -40), (-39.686269666, -5))
        make_face()
    # profile 3 of 3: a face of its own
    with BuildSketch(Plane.XY):
        with BuildLine():
            Line((-43.714985989, 5), (-39.686269666, 5))
            ThreePointArc((-39.686269666, 5), (0, 40), (39.686269666, 5))
            Line((39.686269666, 5), (43.714985989, 5))
            ThreePointArc((43.714985989, 5), (42.344229671, 11.956847978), (39.873820246, 18.603184108))
            ThreePointArc((39.873820246, 18.603184108), (35.507041555, 20.5), (36.047740152, 25.230149225))
            ThreePointArc((36.047740152, 25.230149225), (22, 38.105117767), (3.826080094, 43.833333333))
            ThreePointArc((3.826080094, 43.833333333), (0, 41), (-3.826080094, 43.833333333))
            ThreePointArc((-3.826080094, 43.833333333), (-22, 38.105117767), (-36.047740152, 25.230149225))
            ThreePointArc((-36.047740152, 25.230149225), (-35.507041555, 20.5), (-39.873820246, 18.603184108))
            ThreePointArc((-39.873820246, 18.603184108), (-42.344229671, 11.956847978), (-43.714985989, 5))
        make_face()
    extrude(amount=BOSS_EXTRUDE2_DEPTH)

    # Sketch2<4> → Boss-Extrude3 (add)
    with BuildSketch(Plane.XY):
        with BuildLine():
            Line((-45.727453461, 5), (-43.714985989, 5))
            ThreePointArc((-43.714985989, 5), (-42.344229671, 11.956847978), (-39.873820246, 18.603184108))
            ThreePointArc((-39.873820246, 18.603184108), (-40.820209812, 18.95303615), (-41.648946773, 19.528574775))
            ThreePointArc((-41.648946773, 19.528574775), (-44.288019832, 12.432670643), (-45.727453461, 5))
        make_face()
        with BuildLine():
            ThreePointArc((39.873820246, 18.603184108), (42.344229671, 11.956847978), (43.714985989, 5))
            Line((43.714985989, 5), (45.727453461, 5))
            ThreePointArc((45.727453461, 5), (44.288019832, 12.432670643), (41.648946773, 19.528574775))
            ThreePointArc((41.648946773, 19.528574775), (40.820209812, 18.95303615), (39.873820246, 18.603184108))
        make_face()
        with BuildLine():
            ThreePointArc((-3.912231531, 45.833333333), (-23, 39.837168574), (-37.736715241, 26.304758558))
            ThreePointArc((-37.736715241, 26.304758558), (-36.82391569, 25.87482061), (-36.047740152, 25.230149225))
            ThreePointArc((-36.047740152, 25.230149225), (-22, 38.105117767), (-3.826080094, 43.833333333))
            ThreePointArc((-3.826080094, 43.833333333), (-3.996294121, 44.827856759), (-3.912231531, 45.833333333))
        make_face()
        with BuildLine():
            ThreePointArc((3.826080094, 43.833333333), (22, 38.105117767), (36.047740152, 25.230149225))
            ThreePointArc((36.047740152, 25.230149225), (36.82391569, 25.87482061), (37.736715241, 26.304758558))
            ThreePointArc((37.736715241, 26.304758558), (23, 39.837168574), (3.912231531, 45.833333333))
            ThreePointArc((3.912231531, 45.833333333), (3.996294121, 44.827856759), (3.826080094, 43.833333333))
        make_face()
        with BuildLine():
            Line((-43.714985989, -5), (-45.727453461, -5))
            ThreePointArc((-45.727453461, -5), (-44.288019832, -12.432670643), (-41.648946773, -19.528574775))
            ThreePointArc((-41.648946773, -19.528574775), (-40.820209812, -18.95303615), (-39.873820246, -18.603184108))
            ThreePointArc((-39.873820246, -18.603184108), (-42.344229671, -11.956847978), (-43.714985989, -5))
        make_face()
        with BuildLine():
            ThreePointArc((41.648946773, -19.528574775), (44.288019832, -12.432670643), (45.727453461, -5))
            Line((45.727453461, -5), (43.714985989, -5))
            ThreePointArc((43.714985989, -5), (42.344229671, -11.956847978), (39.873820246, -18.603184108))
            ThreePointArc((39.873820246, -18.603184108), (40.820209812, -18.95303615), (41.648946773, -19.528574775))
        make_face()
        with BuildLine():
            ThreePointArc((-36.047740152, -25.230149225), (-36.82391569, -25.87482061), (-37.736715241, -26.304758558))
            ThreePointArc((-37.736715241, -26.304758558), (-23, -39.837168574), (-3.912231531, -45.833333333))
            ThreePointArc((-3.912231531, -45.833333333), (-3.996294121, -44.827856759), (-3.826080094, -43.833333333))
            ThreePointArc((-3.826080094, -43.833333333), (-22, -38.105117767), (-36.047740152, -25.230149225))
        make_face()
        with BuildLine():
            ThreePointArc((3.826080094, -43.833333333), (3.996294121, -44.827856759), (3.912231531, -45.833333333))
            ThreePointArc((3.912231531, -45.833333333), (23, -39.837168574), (37.736715241, -26.304758558))
            ThreePointArc((37.736715241, -26.304758558), (36.82391569, -25.87482061), (36.047740152, -25.230149225))
            ThreePointArc((36.047740152, -25.230149225), (22, -38.105117767), (3.826080094, -43.833333333))
        make_face()
    extrude(amount=BOSS_EXTRUDE3_DEPTH)


solid = part_1.part
